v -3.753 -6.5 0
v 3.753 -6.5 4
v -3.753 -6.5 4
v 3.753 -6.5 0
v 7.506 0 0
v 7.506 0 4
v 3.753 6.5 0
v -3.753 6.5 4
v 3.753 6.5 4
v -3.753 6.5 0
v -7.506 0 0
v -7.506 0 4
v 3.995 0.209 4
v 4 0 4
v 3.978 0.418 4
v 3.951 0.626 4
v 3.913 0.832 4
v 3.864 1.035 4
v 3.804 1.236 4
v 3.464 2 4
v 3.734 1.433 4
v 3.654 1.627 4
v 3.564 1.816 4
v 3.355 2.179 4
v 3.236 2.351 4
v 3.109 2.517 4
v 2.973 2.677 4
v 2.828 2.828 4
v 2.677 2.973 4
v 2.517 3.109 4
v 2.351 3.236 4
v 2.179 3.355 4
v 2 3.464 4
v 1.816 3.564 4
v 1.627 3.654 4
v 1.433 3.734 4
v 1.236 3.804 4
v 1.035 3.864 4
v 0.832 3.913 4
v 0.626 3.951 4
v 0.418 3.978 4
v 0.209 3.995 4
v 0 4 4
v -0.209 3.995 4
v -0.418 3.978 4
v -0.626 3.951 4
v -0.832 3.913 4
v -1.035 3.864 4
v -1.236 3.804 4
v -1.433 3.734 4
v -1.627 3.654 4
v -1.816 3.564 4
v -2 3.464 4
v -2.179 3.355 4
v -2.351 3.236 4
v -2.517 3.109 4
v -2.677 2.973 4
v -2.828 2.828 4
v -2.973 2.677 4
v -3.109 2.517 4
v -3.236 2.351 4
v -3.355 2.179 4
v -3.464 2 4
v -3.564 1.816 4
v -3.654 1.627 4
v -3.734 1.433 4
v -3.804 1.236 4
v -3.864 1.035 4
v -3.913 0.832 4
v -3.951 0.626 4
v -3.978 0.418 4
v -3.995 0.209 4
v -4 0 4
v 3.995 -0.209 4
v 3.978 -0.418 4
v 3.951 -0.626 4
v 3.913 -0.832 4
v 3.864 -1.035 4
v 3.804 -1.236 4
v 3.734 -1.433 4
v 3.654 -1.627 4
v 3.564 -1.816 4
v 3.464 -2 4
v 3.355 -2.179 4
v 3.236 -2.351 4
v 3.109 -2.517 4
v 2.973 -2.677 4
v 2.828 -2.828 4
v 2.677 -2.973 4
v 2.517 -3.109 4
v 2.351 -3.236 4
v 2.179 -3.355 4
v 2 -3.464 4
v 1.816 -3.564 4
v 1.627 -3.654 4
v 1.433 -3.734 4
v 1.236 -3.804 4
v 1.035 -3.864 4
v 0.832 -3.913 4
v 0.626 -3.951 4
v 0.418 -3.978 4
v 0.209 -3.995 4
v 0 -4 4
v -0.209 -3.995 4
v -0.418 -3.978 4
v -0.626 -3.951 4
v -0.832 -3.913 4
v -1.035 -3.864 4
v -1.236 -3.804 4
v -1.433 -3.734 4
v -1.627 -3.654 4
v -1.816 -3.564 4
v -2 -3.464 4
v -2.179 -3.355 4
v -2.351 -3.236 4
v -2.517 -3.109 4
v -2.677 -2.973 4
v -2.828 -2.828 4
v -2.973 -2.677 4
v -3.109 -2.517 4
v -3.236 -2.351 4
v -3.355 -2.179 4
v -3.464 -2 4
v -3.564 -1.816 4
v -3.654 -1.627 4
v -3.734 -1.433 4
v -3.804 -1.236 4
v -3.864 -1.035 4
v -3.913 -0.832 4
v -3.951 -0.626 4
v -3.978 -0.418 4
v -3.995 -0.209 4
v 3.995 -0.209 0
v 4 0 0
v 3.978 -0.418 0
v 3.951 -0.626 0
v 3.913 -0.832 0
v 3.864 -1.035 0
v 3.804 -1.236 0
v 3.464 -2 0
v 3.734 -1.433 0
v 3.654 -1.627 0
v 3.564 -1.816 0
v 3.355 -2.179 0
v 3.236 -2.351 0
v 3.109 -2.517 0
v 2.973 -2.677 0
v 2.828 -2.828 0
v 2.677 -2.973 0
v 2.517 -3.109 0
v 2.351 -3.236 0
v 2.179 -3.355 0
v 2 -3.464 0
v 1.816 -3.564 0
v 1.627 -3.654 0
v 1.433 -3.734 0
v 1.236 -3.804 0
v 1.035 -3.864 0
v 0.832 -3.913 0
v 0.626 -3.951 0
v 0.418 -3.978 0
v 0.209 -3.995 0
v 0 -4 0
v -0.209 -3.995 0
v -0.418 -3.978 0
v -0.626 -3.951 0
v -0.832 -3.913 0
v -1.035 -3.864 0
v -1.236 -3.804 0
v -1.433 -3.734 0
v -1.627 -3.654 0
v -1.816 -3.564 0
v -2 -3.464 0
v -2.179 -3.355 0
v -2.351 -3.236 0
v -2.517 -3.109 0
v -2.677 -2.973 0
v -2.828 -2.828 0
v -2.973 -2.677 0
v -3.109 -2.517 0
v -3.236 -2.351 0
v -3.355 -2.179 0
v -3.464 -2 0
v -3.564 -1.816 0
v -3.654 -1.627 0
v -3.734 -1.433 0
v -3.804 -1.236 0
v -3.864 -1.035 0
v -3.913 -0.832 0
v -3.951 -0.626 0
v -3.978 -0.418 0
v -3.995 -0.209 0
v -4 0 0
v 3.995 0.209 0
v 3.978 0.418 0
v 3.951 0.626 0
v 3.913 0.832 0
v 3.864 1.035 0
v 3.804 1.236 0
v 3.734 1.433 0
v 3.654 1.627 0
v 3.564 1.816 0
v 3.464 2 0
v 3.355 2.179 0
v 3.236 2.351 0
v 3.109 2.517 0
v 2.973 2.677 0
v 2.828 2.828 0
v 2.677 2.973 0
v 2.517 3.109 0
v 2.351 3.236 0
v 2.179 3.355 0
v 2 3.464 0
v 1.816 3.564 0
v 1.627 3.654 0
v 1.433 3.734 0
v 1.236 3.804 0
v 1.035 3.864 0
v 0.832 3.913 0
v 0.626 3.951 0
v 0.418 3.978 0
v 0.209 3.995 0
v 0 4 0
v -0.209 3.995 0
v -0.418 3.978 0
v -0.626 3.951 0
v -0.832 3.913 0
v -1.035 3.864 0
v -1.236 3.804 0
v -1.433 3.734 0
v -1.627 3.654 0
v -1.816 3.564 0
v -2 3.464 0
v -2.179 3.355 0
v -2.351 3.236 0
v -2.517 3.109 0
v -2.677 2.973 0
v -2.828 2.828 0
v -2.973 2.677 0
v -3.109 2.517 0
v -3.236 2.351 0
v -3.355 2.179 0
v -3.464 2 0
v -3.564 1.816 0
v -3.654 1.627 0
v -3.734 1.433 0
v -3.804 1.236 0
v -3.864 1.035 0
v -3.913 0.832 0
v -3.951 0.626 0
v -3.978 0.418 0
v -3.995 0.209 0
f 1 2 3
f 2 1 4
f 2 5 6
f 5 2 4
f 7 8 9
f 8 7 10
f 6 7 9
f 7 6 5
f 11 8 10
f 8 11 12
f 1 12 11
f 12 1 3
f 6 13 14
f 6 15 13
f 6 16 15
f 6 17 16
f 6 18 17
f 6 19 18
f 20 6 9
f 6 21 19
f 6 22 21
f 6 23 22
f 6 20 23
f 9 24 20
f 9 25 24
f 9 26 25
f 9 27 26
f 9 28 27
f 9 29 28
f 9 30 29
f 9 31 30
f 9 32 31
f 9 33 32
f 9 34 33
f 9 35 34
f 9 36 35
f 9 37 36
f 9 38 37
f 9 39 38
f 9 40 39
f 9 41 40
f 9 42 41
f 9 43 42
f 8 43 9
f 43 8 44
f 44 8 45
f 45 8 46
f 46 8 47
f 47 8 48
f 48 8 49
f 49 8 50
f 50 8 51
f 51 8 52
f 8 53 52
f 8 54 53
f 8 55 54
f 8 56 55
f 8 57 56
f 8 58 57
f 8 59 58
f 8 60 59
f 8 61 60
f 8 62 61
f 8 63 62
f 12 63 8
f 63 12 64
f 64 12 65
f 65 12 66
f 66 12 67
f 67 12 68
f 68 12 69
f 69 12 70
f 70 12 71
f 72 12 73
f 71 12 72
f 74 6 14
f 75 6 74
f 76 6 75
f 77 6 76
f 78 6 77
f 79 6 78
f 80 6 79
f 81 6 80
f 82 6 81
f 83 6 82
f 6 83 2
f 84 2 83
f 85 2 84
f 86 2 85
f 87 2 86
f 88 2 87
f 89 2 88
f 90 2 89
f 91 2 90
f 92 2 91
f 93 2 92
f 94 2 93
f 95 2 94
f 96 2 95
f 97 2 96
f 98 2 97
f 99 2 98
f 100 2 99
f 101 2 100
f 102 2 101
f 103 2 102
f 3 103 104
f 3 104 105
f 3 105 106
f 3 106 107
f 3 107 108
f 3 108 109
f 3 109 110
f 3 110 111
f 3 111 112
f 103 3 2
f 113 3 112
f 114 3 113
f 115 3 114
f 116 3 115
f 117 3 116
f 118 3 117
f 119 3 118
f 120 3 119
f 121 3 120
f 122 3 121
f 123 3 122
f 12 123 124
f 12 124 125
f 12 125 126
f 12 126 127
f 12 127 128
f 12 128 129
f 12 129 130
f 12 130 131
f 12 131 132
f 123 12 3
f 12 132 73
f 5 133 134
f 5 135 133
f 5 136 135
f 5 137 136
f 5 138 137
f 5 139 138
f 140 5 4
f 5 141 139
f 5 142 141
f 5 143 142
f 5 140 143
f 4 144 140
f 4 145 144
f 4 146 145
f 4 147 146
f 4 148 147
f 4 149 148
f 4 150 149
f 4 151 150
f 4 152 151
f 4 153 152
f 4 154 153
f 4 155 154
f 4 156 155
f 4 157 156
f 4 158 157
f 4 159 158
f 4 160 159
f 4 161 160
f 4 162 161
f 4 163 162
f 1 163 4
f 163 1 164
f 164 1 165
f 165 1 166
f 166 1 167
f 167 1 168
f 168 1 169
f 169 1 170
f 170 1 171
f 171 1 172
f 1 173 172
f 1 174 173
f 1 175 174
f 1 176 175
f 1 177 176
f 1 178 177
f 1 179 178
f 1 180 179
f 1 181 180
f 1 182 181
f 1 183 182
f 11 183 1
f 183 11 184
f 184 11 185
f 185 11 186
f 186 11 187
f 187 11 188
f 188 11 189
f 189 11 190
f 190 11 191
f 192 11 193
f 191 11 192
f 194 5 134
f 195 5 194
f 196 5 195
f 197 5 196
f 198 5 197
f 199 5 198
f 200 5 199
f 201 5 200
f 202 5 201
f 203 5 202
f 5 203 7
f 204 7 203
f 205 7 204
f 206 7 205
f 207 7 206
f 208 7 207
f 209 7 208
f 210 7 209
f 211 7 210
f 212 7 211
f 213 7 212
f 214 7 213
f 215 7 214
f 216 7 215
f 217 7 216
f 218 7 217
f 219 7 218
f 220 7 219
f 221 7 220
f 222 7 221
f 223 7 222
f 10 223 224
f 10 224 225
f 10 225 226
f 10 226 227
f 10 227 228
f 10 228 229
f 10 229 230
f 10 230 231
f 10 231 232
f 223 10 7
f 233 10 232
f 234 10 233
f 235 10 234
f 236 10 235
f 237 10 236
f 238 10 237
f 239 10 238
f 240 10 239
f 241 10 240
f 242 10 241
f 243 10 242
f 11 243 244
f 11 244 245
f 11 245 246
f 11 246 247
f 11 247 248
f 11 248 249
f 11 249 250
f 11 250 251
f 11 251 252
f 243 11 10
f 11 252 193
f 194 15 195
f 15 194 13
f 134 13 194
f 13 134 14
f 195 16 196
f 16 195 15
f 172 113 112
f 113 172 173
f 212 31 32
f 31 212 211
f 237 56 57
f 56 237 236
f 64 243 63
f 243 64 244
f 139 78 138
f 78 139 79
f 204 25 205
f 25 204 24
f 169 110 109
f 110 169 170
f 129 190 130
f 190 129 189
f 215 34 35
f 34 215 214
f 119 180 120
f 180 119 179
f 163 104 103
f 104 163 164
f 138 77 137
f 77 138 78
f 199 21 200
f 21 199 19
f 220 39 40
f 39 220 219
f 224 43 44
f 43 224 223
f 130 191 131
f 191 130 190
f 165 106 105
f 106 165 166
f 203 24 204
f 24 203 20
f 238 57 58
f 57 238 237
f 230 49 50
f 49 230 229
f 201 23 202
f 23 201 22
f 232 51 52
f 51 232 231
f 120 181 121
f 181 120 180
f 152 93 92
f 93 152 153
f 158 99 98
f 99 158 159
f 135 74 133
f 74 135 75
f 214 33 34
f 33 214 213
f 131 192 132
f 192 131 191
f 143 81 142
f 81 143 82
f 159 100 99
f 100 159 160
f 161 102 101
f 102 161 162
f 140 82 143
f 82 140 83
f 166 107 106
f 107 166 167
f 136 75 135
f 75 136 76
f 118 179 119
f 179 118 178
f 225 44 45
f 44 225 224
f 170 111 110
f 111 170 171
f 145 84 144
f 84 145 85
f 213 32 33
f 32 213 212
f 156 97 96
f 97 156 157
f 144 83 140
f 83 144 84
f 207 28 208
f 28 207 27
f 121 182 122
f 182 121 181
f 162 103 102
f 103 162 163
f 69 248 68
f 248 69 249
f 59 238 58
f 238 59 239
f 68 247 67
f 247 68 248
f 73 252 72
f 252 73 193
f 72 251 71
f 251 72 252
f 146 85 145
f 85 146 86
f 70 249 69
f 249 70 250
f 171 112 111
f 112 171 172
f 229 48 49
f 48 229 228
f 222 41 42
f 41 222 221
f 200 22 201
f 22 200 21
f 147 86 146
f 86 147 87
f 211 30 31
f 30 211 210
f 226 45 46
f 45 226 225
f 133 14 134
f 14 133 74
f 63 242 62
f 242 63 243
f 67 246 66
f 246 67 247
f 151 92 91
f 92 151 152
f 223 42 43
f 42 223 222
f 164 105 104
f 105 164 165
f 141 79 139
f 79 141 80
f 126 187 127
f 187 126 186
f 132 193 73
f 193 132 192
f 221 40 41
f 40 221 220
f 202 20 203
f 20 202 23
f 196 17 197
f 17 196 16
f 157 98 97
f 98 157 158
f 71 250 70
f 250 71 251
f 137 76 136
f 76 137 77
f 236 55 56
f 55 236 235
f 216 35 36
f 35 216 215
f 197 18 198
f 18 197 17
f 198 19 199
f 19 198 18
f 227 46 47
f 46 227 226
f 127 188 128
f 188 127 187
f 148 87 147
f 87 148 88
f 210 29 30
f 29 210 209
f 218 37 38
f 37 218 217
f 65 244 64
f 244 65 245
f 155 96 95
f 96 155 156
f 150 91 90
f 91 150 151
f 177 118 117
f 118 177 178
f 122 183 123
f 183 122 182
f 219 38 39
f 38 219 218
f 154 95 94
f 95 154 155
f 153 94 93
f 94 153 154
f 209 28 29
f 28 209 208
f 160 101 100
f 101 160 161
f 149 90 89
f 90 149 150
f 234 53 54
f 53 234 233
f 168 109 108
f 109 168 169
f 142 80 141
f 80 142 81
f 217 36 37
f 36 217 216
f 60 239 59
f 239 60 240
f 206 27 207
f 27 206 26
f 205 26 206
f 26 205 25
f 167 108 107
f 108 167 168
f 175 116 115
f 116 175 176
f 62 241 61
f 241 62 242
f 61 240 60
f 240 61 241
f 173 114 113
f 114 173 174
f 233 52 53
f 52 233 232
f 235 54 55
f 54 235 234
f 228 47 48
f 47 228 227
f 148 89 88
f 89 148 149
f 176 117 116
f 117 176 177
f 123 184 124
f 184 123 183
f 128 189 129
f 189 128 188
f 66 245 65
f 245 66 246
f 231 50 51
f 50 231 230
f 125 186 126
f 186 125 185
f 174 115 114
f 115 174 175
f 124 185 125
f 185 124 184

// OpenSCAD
$fn = 120;

screw_d = 8.0;          // mm (clearance hole)
across_flats = 13.0;    // mm
thickness = 4.0;        // mm

// Hex geometry: across_flats = 2 * apothem
apothem = across_flats / 2;
outer_R = apothem / cos(30); // circumradius for hex

difference() {
    // Outer hex prism
    cylinder(h = thickness, r = outer_R, $fn = 6);

    // Through hole for screw
    translate([0, 0, -0.2])
        cylinder(h = thickness + 0.4, d = screw_d, $fn = 120);
}
